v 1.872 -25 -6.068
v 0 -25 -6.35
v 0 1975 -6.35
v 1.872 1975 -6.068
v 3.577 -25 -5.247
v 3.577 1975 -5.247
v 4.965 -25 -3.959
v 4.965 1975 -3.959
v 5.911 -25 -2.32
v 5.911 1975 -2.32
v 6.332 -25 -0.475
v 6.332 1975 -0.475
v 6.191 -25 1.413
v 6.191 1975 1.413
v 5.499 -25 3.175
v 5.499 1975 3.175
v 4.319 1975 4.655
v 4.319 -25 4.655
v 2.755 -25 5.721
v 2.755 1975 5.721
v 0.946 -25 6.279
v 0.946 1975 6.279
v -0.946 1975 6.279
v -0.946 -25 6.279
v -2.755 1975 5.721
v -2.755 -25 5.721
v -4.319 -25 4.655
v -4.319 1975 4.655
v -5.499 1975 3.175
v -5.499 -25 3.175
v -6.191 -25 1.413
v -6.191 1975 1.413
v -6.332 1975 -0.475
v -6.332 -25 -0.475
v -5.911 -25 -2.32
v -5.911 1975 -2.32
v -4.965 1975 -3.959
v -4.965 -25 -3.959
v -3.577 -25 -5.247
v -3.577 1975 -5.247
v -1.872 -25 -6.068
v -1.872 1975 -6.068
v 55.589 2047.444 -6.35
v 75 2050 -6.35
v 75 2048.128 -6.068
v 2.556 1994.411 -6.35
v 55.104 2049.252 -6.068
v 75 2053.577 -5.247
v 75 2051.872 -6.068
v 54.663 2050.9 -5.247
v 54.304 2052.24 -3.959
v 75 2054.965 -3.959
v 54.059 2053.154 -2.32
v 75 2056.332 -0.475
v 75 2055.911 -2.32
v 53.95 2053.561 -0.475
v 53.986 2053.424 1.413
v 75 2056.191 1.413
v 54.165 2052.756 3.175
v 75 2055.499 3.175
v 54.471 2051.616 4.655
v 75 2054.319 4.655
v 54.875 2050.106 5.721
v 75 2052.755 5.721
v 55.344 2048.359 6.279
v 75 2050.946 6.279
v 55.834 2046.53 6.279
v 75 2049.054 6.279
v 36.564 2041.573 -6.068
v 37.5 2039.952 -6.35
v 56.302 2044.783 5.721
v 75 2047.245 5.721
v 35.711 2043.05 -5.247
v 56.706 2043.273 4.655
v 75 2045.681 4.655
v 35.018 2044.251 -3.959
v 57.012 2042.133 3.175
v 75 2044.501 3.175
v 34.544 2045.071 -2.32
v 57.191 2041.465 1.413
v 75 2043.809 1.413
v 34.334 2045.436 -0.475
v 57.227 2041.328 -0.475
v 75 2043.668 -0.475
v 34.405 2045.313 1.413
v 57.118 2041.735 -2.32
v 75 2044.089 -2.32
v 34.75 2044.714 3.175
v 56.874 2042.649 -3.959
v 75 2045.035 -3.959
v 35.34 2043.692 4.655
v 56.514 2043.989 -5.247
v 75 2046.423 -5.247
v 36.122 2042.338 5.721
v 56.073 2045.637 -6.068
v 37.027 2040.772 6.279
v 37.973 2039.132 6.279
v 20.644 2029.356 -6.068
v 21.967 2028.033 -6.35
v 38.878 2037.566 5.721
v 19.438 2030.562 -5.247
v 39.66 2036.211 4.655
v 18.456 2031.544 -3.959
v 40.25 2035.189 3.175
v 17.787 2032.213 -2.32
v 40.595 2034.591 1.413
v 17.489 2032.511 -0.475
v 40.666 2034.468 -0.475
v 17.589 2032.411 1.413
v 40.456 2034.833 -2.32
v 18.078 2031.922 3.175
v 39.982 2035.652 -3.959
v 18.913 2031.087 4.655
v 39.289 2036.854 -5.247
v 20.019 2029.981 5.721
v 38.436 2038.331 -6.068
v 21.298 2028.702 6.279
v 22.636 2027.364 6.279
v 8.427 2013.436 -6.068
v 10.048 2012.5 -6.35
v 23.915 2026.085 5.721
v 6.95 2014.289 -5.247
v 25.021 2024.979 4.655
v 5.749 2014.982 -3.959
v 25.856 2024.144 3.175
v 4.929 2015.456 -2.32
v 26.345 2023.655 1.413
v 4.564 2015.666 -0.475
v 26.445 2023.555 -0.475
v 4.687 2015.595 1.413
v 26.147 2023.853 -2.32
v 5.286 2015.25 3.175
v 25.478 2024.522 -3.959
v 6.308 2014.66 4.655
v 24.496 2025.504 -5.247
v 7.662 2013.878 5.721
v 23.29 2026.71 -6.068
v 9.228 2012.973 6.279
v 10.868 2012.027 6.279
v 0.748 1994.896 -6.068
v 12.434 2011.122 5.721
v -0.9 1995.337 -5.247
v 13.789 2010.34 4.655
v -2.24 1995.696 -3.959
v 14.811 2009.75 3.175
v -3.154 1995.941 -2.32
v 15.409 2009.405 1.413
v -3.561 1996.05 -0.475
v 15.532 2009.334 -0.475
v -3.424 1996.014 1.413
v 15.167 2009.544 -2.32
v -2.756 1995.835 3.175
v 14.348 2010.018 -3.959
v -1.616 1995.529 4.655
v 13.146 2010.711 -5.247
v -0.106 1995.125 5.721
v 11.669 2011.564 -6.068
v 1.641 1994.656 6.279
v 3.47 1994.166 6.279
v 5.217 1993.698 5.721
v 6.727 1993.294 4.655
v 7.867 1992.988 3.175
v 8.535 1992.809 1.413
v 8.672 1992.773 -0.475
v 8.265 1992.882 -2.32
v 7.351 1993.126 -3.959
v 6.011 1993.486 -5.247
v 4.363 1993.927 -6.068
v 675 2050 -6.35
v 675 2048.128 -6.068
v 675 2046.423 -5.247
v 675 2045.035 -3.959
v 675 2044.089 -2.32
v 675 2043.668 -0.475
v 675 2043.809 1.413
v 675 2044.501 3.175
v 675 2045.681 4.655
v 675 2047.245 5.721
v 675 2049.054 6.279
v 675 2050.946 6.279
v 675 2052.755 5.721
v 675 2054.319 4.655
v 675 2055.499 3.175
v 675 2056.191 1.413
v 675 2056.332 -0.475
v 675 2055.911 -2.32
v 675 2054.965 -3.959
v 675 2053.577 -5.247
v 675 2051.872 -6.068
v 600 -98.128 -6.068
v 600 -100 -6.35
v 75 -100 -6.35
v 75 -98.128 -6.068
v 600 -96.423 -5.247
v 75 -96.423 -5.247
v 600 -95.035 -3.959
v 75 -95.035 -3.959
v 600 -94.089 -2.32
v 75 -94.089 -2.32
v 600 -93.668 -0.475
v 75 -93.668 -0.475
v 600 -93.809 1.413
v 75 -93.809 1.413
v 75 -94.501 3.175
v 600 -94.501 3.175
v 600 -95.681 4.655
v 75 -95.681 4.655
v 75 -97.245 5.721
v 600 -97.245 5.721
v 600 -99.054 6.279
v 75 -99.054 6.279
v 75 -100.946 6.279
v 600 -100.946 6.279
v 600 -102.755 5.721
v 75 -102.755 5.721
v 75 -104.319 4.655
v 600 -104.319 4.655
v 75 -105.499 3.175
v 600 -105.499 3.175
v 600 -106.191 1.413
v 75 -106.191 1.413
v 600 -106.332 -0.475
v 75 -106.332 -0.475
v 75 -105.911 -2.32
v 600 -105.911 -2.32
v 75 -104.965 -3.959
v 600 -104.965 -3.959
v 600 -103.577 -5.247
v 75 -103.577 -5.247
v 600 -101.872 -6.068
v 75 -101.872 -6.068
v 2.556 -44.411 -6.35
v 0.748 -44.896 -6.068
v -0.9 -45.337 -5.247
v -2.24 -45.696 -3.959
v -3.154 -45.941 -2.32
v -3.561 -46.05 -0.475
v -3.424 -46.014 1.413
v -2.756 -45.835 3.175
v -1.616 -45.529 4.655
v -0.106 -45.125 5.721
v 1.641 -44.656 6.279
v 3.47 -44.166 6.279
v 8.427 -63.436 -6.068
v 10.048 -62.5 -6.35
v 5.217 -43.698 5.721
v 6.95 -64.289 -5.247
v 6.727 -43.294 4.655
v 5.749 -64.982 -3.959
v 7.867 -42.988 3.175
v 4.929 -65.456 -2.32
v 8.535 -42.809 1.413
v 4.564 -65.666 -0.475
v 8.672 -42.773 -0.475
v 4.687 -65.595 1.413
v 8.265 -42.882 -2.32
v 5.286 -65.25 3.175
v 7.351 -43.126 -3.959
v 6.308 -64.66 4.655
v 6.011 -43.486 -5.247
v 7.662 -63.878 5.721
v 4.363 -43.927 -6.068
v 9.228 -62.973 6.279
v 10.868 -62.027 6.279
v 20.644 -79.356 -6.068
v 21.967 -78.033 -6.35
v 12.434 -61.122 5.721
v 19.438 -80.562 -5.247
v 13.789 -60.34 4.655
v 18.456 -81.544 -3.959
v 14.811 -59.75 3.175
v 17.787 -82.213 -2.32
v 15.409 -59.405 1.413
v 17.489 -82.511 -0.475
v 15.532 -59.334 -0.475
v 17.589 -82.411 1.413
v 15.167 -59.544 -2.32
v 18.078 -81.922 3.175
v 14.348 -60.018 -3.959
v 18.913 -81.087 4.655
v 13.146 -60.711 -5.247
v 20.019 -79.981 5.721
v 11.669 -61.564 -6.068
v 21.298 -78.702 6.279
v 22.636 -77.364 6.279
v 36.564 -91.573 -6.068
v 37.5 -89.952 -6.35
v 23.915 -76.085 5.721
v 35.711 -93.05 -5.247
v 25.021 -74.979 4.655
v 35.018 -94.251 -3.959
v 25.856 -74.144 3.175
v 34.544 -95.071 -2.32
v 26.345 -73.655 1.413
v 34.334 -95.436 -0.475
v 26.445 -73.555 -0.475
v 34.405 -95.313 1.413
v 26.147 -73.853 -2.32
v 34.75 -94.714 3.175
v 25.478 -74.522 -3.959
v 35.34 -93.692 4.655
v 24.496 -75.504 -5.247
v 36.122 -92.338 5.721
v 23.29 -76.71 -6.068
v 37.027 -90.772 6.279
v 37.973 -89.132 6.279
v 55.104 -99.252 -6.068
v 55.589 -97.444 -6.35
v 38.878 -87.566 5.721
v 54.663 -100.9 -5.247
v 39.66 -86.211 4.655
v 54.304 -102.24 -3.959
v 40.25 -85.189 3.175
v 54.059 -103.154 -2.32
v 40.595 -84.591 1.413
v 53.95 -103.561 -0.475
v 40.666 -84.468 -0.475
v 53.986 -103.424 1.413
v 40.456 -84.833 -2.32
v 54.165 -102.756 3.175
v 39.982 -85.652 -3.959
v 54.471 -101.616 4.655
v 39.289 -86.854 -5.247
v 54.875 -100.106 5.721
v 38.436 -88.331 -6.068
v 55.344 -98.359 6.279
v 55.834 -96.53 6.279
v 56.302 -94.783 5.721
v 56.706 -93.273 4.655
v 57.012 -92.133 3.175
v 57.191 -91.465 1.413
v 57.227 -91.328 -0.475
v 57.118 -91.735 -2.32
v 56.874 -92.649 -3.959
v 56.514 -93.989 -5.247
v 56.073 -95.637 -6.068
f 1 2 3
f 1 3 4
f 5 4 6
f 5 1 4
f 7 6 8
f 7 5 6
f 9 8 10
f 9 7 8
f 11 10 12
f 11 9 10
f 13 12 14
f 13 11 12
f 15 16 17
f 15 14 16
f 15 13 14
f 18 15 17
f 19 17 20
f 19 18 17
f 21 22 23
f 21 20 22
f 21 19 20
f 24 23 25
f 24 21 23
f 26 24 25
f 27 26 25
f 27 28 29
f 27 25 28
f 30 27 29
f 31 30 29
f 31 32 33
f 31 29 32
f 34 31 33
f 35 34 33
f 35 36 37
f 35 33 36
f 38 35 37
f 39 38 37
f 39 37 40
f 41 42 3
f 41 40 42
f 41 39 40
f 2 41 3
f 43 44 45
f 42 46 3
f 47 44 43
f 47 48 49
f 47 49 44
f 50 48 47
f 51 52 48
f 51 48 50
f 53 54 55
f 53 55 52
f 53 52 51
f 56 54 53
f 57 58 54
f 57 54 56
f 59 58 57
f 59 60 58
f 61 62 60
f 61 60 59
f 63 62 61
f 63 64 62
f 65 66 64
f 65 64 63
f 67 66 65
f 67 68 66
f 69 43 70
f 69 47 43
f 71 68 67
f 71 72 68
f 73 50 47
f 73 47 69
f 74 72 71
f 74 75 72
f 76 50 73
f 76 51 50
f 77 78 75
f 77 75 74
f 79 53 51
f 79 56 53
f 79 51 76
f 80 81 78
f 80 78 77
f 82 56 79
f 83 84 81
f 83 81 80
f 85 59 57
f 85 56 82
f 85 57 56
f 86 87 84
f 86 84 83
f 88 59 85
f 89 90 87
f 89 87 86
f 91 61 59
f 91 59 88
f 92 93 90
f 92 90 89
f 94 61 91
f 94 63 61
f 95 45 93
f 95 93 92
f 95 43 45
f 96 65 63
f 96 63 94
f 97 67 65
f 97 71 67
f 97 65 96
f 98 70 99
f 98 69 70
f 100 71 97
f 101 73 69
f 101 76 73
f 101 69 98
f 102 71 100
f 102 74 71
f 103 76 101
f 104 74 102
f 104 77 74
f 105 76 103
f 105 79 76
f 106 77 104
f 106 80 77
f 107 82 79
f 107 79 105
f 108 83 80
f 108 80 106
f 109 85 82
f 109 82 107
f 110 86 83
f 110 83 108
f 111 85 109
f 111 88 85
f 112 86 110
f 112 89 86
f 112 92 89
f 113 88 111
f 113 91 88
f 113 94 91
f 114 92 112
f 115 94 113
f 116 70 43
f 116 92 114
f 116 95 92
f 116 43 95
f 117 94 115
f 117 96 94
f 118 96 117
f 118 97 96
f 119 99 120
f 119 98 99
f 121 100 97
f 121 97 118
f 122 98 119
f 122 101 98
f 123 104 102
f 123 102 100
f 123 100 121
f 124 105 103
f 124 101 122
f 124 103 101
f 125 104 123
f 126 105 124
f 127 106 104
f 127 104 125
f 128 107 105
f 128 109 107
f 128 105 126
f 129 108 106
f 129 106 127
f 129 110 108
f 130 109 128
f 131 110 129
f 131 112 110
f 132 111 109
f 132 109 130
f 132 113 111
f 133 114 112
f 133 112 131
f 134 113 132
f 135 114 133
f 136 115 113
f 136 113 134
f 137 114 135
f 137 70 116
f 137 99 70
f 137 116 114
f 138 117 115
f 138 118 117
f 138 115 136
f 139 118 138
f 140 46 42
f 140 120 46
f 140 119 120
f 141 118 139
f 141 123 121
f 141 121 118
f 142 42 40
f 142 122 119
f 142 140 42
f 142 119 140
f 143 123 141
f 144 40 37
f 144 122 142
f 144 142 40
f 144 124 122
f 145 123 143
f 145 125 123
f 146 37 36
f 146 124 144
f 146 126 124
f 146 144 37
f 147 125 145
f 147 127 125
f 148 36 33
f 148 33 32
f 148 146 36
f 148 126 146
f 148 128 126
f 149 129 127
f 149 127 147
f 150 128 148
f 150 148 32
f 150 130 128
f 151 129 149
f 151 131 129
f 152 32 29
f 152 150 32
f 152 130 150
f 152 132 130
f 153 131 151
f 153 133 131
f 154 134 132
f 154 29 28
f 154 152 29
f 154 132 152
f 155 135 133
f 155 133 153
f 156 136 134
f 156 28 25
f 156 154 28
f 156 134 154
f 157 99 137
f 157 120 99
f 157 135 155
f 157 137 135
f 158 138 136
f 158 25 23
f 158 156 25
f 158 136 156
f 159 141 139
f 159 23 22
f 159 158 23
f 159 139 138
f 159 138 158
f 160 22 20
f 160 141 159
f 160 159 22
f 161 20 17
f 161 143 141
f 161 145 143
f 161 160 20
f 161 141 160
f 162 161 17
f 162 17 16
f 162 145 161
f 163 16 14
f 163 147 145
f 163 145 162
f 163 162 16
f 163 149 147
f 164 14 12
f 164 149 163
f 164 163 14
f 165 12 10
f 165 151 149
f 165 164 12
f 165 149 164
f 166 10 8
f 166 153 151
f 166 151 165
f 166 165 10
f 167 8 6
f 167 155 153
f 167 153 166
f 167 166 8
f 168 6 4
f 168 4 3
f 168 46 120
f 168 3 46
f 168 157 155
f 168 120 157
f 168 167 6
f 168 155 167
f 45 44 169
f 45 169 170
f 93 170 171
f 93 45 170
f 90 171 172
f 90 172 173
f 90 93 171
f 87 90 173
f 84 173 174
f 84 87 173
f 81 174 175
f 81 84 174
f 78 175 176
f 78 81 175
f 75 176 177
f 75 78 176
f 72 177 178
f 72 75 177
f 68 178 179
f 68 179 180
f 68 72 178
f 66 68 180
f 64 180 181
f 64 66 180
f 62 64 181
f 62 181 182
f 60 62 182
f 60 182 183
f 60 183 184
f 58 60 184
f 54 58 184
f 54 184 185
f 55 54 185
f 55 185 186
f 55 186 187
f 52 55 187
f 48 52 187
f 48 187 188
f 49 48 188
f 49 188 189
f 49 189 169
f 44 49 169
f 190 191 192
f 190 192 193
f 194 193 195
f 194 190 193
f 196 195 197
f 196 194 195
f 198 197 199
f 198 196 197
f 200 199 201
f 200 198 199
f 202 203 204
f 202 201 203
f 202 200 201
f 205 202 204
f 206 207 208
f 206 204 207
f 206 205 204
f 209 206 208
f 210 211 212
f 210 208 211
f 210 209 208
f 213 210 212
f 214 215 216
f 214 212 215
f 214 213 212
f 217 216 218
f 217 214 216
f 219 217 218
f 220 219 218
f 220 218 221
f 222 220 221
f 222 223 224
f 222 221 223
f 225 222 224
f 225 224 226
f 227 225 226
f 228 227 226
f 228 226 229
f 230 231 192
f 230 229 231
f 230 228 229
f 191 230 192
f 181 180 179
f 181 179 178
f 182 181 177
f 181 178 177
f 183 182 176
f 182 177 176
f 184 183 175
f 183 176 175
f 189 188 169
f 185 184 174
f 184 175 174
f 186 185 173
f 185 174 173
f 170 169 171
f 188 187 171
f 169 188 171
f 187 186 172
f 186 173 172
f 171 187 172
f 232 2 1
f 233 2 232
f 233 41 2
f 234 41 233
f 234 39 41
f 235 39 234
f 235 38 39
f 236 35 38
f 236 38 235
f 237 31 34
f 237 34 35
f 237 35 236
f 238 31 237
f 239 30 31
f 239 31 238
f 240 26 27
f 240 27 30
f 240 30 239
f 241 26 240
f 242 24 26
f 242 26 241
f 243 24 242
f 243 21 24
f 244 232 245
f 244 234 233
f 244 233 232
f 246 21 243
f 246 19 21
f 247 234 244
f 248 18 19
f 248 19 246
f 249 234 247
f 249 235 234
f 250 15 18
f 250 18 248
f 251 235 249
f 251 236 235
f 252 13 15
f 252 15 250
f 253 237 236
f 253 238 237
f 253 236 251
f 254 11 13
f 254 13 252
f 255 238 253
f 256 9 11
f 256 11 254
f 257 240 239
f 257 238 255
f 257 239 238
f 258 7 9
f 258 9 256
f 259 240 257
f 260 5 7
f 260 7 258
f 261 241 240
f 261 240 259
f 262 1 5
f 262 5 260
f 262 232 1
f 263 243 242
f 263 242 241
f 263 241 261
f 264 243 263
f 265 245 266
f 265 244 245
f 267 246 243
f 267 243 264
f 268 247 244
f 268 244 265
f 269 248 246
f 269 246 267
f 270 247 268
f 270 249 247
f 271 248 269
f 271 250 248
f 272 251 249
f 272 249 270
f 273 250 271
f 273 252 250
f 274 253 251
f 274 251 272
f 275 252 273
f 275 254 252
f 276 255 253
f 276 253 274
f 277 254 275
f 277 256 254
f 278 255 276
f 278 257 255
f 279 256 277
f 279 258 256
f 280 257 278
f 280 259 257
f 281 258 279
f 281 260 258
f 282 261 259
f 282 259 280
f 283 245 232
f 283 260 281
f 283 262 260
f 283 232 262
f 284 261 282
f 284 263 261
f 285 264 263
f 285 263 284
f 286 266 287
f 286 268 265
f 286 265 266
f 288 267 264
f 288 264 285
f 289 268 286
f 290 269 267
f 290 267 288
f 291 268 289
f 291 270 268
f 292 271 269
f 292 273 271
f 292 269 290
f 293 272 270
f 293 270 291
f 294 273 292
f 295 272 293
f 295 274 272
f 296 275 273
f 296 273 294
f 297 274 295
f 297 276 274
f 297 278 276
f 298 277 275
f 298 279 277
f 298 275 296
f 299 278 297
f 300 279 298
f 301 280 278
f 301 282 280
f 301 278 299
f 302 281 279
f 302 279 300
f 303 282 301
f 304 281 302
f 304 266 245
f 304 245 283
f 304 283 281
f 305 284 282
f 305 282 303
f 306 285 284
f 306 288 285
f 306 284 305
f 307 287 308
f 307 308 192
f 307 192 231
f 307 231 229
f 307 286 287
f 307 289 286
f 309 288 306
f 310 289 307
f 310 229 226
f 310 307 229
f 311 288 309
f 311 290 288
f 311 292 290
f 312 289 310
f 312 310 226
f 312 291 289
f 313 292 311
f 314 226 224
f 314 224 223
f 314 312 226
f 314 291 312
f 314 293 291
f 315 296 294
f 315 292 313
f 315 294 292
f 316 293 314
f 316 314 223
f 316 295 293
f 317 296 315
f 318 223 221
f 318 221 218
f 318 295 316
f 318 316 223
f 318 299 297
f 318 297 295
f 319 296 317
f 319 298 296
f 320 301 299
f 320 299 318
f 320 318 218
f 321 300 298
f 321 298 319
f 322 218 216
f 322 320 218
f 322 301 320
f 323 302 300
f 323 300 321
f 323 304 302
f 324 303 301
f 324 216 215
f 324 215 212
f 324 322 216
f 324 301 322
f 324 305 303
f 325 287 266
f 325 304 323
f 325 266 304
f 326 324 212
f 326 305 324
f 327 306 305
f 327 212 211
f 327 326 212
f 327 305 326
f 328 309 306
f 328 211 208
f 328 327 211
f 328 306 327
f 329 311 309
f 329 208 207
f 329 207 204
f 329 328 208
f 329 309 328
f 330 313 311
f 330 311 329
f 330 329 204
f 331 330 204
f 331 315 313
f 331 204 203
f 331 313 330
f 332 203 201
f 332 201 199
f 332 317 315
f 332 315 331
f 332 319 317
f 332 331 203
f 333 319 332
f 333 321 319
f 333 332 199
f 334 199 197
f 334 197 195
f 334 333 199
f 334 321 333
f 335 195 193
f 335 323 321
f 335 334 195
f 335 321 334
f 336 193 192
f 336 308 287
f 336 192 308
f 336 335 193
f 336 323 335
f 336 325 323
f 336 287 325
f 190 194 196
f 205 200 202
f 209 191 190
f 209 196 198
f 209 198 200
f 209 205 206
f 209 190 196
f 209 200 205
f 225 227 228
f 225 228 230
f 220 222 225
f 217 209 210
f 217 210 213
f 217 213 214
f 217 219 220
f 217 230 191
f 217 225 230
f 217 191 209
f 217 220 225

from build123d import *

# Parameters (mm, degrees)
SWEEP1_PROFILE_R = 6.35


with BuildPart() as part:
    # Sweep1: sweep along a path in Sketch1
    with BuildLine(Plane.XY) as sweep1_path:
        Line((675, 2050), (75, 2050))
        ThreePointArc((75, 2050), (21.966991411, 2028.033008589), (0, 1975))
        Line((0, 1975), (0, 0))
        Line((0, 0), (0, -25))
        ThreePointArc((0, -25), (21.966991411, -78.033008589), (75, -100))
        Line((75, -100), (600, -100))
    # Sweep1 profile (on start of the path) → Sweep1 (sweep)
    with BuildSketch(Plane(origin=(675, 2050, 0), x_dir=(0, 0, -1), z_dir=(-1, 0, 0))):
        Circle(SWEEP1_PROFILE_R)
    sweep(path=sweep1_path.line)


solid = part.part
